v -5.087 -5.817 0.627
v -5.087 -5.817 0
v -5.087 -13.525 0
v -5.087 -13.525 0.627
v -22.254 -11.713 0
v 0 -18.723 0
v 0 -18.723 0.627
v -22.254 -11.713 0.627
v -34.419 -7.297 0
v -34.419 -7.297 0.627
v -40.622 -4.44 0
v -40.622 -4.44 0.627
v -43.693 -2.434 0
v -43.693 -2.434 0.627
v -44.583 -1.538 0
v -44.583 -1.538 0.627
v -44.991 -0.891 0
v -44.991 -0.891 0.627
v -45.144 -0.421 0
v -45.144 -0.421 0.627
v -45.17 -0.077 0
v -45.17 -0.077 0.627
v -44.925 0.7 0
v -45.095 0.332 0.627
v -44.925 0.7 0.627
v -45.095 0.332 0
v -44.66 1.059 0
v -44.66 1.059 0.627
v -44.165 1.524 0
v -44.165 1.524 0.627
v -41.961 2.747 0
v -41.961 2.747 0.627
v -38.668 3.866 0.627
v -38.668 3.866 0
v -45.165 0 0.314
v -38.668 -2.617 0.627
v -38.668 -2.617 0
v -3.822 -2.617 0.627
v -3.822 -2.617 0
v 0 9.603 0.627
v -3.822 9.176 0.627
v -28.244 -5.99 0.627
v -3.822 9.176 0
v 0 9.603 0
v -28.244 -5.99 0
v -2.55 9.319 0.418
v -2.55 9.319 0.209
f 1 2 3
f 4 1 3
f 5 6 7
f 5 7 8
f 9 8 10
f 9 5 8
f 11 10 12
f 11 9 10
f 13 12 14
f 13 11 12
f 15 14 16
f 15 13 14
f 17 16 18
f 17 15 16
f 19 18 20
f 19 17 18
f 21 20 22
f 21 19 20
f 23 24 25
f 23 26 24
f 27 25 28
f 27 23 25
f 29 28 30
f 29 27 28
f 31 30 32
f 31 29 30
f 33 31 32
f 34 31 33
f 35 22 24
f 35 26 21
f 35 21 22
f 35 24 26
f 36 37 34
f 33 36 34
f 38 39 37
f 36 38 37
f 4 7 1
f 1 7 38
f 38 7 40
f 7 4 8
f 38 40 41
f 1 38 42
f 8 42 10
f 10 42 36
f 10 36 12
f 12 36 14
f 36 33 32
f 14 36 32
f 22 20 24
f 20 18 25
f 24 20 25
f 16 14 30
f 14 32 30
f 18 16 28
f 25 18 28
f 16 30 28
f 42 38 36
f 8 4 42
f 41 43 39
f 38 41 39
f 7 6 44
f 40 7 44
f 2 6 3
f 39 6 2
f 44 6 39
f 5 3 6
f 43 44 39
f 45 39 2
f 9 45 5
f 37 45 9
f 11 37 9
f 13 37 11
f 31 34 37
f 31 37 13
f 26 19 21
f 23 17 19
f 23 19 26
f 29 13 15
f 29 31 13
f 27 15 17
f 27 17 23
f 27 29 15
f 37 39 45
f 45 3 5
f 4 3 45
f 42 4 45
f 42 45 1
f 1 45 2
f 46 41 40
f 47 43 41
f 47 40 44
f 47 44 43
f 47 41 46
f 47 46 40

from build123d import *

# Parameters (mm, degrees)
F1_DEPTH = 0.6274920888


with BuildPart() as f1:
    # F0 (on Top) → F1 (new body)
    with BuildSketch(Plane.XY):
        with BuildLine():
            add(Edge.make_bspline(
                [(0, -18.7230408192), (-22.8005940455, -11.7347187551), (-52.7318931928, -2.5608557428), (-42.6186198614, 2.7495160437), (-38.6679108208, 3.8659247252)],
                knots=[0, 0, 0, 0, 0.5071475473, 0.6657537861, 0.6657537861, 0.6657537861, 0.6657537861], degree=3))
            Line((0, -18.7230408192), (0, -2.6170264397))
            Line((0, -2.6170264397), (0, 9.6031874418))
            add(Edge.make_bspline(
                [(-3.8220100603, 9.1760117782), (-2.5507177683, 9.3186652316), (-1.275358836, 9.4609263335), (0, 9.6031874418)],
                knots=[0.9719015733, 0.9719015733, 0.9719015733, 0.9719015733, 1, 1, 1, 1], degree=3))
            Line((-3.8220100603, 9.1760117782), (-3.8220100603, -2.6170264397))
            Line((-3.8220100603, -2.6170264397), (-38.6679108208, -2.6170264397))
            Line((-38.6679108208, -2.6170264397), (-38.6679108208, 3.8659247252))
        make_face()
        Polygon((-5.0867283717, -13.5254897177), (-28.2443165779, -5.9904903173), (-5.0867283717, -5.8171749115), align=None, mode=Mode.SUBTRACT)
    extrude(amount=F1_DEPTH)


solid = f1.part
